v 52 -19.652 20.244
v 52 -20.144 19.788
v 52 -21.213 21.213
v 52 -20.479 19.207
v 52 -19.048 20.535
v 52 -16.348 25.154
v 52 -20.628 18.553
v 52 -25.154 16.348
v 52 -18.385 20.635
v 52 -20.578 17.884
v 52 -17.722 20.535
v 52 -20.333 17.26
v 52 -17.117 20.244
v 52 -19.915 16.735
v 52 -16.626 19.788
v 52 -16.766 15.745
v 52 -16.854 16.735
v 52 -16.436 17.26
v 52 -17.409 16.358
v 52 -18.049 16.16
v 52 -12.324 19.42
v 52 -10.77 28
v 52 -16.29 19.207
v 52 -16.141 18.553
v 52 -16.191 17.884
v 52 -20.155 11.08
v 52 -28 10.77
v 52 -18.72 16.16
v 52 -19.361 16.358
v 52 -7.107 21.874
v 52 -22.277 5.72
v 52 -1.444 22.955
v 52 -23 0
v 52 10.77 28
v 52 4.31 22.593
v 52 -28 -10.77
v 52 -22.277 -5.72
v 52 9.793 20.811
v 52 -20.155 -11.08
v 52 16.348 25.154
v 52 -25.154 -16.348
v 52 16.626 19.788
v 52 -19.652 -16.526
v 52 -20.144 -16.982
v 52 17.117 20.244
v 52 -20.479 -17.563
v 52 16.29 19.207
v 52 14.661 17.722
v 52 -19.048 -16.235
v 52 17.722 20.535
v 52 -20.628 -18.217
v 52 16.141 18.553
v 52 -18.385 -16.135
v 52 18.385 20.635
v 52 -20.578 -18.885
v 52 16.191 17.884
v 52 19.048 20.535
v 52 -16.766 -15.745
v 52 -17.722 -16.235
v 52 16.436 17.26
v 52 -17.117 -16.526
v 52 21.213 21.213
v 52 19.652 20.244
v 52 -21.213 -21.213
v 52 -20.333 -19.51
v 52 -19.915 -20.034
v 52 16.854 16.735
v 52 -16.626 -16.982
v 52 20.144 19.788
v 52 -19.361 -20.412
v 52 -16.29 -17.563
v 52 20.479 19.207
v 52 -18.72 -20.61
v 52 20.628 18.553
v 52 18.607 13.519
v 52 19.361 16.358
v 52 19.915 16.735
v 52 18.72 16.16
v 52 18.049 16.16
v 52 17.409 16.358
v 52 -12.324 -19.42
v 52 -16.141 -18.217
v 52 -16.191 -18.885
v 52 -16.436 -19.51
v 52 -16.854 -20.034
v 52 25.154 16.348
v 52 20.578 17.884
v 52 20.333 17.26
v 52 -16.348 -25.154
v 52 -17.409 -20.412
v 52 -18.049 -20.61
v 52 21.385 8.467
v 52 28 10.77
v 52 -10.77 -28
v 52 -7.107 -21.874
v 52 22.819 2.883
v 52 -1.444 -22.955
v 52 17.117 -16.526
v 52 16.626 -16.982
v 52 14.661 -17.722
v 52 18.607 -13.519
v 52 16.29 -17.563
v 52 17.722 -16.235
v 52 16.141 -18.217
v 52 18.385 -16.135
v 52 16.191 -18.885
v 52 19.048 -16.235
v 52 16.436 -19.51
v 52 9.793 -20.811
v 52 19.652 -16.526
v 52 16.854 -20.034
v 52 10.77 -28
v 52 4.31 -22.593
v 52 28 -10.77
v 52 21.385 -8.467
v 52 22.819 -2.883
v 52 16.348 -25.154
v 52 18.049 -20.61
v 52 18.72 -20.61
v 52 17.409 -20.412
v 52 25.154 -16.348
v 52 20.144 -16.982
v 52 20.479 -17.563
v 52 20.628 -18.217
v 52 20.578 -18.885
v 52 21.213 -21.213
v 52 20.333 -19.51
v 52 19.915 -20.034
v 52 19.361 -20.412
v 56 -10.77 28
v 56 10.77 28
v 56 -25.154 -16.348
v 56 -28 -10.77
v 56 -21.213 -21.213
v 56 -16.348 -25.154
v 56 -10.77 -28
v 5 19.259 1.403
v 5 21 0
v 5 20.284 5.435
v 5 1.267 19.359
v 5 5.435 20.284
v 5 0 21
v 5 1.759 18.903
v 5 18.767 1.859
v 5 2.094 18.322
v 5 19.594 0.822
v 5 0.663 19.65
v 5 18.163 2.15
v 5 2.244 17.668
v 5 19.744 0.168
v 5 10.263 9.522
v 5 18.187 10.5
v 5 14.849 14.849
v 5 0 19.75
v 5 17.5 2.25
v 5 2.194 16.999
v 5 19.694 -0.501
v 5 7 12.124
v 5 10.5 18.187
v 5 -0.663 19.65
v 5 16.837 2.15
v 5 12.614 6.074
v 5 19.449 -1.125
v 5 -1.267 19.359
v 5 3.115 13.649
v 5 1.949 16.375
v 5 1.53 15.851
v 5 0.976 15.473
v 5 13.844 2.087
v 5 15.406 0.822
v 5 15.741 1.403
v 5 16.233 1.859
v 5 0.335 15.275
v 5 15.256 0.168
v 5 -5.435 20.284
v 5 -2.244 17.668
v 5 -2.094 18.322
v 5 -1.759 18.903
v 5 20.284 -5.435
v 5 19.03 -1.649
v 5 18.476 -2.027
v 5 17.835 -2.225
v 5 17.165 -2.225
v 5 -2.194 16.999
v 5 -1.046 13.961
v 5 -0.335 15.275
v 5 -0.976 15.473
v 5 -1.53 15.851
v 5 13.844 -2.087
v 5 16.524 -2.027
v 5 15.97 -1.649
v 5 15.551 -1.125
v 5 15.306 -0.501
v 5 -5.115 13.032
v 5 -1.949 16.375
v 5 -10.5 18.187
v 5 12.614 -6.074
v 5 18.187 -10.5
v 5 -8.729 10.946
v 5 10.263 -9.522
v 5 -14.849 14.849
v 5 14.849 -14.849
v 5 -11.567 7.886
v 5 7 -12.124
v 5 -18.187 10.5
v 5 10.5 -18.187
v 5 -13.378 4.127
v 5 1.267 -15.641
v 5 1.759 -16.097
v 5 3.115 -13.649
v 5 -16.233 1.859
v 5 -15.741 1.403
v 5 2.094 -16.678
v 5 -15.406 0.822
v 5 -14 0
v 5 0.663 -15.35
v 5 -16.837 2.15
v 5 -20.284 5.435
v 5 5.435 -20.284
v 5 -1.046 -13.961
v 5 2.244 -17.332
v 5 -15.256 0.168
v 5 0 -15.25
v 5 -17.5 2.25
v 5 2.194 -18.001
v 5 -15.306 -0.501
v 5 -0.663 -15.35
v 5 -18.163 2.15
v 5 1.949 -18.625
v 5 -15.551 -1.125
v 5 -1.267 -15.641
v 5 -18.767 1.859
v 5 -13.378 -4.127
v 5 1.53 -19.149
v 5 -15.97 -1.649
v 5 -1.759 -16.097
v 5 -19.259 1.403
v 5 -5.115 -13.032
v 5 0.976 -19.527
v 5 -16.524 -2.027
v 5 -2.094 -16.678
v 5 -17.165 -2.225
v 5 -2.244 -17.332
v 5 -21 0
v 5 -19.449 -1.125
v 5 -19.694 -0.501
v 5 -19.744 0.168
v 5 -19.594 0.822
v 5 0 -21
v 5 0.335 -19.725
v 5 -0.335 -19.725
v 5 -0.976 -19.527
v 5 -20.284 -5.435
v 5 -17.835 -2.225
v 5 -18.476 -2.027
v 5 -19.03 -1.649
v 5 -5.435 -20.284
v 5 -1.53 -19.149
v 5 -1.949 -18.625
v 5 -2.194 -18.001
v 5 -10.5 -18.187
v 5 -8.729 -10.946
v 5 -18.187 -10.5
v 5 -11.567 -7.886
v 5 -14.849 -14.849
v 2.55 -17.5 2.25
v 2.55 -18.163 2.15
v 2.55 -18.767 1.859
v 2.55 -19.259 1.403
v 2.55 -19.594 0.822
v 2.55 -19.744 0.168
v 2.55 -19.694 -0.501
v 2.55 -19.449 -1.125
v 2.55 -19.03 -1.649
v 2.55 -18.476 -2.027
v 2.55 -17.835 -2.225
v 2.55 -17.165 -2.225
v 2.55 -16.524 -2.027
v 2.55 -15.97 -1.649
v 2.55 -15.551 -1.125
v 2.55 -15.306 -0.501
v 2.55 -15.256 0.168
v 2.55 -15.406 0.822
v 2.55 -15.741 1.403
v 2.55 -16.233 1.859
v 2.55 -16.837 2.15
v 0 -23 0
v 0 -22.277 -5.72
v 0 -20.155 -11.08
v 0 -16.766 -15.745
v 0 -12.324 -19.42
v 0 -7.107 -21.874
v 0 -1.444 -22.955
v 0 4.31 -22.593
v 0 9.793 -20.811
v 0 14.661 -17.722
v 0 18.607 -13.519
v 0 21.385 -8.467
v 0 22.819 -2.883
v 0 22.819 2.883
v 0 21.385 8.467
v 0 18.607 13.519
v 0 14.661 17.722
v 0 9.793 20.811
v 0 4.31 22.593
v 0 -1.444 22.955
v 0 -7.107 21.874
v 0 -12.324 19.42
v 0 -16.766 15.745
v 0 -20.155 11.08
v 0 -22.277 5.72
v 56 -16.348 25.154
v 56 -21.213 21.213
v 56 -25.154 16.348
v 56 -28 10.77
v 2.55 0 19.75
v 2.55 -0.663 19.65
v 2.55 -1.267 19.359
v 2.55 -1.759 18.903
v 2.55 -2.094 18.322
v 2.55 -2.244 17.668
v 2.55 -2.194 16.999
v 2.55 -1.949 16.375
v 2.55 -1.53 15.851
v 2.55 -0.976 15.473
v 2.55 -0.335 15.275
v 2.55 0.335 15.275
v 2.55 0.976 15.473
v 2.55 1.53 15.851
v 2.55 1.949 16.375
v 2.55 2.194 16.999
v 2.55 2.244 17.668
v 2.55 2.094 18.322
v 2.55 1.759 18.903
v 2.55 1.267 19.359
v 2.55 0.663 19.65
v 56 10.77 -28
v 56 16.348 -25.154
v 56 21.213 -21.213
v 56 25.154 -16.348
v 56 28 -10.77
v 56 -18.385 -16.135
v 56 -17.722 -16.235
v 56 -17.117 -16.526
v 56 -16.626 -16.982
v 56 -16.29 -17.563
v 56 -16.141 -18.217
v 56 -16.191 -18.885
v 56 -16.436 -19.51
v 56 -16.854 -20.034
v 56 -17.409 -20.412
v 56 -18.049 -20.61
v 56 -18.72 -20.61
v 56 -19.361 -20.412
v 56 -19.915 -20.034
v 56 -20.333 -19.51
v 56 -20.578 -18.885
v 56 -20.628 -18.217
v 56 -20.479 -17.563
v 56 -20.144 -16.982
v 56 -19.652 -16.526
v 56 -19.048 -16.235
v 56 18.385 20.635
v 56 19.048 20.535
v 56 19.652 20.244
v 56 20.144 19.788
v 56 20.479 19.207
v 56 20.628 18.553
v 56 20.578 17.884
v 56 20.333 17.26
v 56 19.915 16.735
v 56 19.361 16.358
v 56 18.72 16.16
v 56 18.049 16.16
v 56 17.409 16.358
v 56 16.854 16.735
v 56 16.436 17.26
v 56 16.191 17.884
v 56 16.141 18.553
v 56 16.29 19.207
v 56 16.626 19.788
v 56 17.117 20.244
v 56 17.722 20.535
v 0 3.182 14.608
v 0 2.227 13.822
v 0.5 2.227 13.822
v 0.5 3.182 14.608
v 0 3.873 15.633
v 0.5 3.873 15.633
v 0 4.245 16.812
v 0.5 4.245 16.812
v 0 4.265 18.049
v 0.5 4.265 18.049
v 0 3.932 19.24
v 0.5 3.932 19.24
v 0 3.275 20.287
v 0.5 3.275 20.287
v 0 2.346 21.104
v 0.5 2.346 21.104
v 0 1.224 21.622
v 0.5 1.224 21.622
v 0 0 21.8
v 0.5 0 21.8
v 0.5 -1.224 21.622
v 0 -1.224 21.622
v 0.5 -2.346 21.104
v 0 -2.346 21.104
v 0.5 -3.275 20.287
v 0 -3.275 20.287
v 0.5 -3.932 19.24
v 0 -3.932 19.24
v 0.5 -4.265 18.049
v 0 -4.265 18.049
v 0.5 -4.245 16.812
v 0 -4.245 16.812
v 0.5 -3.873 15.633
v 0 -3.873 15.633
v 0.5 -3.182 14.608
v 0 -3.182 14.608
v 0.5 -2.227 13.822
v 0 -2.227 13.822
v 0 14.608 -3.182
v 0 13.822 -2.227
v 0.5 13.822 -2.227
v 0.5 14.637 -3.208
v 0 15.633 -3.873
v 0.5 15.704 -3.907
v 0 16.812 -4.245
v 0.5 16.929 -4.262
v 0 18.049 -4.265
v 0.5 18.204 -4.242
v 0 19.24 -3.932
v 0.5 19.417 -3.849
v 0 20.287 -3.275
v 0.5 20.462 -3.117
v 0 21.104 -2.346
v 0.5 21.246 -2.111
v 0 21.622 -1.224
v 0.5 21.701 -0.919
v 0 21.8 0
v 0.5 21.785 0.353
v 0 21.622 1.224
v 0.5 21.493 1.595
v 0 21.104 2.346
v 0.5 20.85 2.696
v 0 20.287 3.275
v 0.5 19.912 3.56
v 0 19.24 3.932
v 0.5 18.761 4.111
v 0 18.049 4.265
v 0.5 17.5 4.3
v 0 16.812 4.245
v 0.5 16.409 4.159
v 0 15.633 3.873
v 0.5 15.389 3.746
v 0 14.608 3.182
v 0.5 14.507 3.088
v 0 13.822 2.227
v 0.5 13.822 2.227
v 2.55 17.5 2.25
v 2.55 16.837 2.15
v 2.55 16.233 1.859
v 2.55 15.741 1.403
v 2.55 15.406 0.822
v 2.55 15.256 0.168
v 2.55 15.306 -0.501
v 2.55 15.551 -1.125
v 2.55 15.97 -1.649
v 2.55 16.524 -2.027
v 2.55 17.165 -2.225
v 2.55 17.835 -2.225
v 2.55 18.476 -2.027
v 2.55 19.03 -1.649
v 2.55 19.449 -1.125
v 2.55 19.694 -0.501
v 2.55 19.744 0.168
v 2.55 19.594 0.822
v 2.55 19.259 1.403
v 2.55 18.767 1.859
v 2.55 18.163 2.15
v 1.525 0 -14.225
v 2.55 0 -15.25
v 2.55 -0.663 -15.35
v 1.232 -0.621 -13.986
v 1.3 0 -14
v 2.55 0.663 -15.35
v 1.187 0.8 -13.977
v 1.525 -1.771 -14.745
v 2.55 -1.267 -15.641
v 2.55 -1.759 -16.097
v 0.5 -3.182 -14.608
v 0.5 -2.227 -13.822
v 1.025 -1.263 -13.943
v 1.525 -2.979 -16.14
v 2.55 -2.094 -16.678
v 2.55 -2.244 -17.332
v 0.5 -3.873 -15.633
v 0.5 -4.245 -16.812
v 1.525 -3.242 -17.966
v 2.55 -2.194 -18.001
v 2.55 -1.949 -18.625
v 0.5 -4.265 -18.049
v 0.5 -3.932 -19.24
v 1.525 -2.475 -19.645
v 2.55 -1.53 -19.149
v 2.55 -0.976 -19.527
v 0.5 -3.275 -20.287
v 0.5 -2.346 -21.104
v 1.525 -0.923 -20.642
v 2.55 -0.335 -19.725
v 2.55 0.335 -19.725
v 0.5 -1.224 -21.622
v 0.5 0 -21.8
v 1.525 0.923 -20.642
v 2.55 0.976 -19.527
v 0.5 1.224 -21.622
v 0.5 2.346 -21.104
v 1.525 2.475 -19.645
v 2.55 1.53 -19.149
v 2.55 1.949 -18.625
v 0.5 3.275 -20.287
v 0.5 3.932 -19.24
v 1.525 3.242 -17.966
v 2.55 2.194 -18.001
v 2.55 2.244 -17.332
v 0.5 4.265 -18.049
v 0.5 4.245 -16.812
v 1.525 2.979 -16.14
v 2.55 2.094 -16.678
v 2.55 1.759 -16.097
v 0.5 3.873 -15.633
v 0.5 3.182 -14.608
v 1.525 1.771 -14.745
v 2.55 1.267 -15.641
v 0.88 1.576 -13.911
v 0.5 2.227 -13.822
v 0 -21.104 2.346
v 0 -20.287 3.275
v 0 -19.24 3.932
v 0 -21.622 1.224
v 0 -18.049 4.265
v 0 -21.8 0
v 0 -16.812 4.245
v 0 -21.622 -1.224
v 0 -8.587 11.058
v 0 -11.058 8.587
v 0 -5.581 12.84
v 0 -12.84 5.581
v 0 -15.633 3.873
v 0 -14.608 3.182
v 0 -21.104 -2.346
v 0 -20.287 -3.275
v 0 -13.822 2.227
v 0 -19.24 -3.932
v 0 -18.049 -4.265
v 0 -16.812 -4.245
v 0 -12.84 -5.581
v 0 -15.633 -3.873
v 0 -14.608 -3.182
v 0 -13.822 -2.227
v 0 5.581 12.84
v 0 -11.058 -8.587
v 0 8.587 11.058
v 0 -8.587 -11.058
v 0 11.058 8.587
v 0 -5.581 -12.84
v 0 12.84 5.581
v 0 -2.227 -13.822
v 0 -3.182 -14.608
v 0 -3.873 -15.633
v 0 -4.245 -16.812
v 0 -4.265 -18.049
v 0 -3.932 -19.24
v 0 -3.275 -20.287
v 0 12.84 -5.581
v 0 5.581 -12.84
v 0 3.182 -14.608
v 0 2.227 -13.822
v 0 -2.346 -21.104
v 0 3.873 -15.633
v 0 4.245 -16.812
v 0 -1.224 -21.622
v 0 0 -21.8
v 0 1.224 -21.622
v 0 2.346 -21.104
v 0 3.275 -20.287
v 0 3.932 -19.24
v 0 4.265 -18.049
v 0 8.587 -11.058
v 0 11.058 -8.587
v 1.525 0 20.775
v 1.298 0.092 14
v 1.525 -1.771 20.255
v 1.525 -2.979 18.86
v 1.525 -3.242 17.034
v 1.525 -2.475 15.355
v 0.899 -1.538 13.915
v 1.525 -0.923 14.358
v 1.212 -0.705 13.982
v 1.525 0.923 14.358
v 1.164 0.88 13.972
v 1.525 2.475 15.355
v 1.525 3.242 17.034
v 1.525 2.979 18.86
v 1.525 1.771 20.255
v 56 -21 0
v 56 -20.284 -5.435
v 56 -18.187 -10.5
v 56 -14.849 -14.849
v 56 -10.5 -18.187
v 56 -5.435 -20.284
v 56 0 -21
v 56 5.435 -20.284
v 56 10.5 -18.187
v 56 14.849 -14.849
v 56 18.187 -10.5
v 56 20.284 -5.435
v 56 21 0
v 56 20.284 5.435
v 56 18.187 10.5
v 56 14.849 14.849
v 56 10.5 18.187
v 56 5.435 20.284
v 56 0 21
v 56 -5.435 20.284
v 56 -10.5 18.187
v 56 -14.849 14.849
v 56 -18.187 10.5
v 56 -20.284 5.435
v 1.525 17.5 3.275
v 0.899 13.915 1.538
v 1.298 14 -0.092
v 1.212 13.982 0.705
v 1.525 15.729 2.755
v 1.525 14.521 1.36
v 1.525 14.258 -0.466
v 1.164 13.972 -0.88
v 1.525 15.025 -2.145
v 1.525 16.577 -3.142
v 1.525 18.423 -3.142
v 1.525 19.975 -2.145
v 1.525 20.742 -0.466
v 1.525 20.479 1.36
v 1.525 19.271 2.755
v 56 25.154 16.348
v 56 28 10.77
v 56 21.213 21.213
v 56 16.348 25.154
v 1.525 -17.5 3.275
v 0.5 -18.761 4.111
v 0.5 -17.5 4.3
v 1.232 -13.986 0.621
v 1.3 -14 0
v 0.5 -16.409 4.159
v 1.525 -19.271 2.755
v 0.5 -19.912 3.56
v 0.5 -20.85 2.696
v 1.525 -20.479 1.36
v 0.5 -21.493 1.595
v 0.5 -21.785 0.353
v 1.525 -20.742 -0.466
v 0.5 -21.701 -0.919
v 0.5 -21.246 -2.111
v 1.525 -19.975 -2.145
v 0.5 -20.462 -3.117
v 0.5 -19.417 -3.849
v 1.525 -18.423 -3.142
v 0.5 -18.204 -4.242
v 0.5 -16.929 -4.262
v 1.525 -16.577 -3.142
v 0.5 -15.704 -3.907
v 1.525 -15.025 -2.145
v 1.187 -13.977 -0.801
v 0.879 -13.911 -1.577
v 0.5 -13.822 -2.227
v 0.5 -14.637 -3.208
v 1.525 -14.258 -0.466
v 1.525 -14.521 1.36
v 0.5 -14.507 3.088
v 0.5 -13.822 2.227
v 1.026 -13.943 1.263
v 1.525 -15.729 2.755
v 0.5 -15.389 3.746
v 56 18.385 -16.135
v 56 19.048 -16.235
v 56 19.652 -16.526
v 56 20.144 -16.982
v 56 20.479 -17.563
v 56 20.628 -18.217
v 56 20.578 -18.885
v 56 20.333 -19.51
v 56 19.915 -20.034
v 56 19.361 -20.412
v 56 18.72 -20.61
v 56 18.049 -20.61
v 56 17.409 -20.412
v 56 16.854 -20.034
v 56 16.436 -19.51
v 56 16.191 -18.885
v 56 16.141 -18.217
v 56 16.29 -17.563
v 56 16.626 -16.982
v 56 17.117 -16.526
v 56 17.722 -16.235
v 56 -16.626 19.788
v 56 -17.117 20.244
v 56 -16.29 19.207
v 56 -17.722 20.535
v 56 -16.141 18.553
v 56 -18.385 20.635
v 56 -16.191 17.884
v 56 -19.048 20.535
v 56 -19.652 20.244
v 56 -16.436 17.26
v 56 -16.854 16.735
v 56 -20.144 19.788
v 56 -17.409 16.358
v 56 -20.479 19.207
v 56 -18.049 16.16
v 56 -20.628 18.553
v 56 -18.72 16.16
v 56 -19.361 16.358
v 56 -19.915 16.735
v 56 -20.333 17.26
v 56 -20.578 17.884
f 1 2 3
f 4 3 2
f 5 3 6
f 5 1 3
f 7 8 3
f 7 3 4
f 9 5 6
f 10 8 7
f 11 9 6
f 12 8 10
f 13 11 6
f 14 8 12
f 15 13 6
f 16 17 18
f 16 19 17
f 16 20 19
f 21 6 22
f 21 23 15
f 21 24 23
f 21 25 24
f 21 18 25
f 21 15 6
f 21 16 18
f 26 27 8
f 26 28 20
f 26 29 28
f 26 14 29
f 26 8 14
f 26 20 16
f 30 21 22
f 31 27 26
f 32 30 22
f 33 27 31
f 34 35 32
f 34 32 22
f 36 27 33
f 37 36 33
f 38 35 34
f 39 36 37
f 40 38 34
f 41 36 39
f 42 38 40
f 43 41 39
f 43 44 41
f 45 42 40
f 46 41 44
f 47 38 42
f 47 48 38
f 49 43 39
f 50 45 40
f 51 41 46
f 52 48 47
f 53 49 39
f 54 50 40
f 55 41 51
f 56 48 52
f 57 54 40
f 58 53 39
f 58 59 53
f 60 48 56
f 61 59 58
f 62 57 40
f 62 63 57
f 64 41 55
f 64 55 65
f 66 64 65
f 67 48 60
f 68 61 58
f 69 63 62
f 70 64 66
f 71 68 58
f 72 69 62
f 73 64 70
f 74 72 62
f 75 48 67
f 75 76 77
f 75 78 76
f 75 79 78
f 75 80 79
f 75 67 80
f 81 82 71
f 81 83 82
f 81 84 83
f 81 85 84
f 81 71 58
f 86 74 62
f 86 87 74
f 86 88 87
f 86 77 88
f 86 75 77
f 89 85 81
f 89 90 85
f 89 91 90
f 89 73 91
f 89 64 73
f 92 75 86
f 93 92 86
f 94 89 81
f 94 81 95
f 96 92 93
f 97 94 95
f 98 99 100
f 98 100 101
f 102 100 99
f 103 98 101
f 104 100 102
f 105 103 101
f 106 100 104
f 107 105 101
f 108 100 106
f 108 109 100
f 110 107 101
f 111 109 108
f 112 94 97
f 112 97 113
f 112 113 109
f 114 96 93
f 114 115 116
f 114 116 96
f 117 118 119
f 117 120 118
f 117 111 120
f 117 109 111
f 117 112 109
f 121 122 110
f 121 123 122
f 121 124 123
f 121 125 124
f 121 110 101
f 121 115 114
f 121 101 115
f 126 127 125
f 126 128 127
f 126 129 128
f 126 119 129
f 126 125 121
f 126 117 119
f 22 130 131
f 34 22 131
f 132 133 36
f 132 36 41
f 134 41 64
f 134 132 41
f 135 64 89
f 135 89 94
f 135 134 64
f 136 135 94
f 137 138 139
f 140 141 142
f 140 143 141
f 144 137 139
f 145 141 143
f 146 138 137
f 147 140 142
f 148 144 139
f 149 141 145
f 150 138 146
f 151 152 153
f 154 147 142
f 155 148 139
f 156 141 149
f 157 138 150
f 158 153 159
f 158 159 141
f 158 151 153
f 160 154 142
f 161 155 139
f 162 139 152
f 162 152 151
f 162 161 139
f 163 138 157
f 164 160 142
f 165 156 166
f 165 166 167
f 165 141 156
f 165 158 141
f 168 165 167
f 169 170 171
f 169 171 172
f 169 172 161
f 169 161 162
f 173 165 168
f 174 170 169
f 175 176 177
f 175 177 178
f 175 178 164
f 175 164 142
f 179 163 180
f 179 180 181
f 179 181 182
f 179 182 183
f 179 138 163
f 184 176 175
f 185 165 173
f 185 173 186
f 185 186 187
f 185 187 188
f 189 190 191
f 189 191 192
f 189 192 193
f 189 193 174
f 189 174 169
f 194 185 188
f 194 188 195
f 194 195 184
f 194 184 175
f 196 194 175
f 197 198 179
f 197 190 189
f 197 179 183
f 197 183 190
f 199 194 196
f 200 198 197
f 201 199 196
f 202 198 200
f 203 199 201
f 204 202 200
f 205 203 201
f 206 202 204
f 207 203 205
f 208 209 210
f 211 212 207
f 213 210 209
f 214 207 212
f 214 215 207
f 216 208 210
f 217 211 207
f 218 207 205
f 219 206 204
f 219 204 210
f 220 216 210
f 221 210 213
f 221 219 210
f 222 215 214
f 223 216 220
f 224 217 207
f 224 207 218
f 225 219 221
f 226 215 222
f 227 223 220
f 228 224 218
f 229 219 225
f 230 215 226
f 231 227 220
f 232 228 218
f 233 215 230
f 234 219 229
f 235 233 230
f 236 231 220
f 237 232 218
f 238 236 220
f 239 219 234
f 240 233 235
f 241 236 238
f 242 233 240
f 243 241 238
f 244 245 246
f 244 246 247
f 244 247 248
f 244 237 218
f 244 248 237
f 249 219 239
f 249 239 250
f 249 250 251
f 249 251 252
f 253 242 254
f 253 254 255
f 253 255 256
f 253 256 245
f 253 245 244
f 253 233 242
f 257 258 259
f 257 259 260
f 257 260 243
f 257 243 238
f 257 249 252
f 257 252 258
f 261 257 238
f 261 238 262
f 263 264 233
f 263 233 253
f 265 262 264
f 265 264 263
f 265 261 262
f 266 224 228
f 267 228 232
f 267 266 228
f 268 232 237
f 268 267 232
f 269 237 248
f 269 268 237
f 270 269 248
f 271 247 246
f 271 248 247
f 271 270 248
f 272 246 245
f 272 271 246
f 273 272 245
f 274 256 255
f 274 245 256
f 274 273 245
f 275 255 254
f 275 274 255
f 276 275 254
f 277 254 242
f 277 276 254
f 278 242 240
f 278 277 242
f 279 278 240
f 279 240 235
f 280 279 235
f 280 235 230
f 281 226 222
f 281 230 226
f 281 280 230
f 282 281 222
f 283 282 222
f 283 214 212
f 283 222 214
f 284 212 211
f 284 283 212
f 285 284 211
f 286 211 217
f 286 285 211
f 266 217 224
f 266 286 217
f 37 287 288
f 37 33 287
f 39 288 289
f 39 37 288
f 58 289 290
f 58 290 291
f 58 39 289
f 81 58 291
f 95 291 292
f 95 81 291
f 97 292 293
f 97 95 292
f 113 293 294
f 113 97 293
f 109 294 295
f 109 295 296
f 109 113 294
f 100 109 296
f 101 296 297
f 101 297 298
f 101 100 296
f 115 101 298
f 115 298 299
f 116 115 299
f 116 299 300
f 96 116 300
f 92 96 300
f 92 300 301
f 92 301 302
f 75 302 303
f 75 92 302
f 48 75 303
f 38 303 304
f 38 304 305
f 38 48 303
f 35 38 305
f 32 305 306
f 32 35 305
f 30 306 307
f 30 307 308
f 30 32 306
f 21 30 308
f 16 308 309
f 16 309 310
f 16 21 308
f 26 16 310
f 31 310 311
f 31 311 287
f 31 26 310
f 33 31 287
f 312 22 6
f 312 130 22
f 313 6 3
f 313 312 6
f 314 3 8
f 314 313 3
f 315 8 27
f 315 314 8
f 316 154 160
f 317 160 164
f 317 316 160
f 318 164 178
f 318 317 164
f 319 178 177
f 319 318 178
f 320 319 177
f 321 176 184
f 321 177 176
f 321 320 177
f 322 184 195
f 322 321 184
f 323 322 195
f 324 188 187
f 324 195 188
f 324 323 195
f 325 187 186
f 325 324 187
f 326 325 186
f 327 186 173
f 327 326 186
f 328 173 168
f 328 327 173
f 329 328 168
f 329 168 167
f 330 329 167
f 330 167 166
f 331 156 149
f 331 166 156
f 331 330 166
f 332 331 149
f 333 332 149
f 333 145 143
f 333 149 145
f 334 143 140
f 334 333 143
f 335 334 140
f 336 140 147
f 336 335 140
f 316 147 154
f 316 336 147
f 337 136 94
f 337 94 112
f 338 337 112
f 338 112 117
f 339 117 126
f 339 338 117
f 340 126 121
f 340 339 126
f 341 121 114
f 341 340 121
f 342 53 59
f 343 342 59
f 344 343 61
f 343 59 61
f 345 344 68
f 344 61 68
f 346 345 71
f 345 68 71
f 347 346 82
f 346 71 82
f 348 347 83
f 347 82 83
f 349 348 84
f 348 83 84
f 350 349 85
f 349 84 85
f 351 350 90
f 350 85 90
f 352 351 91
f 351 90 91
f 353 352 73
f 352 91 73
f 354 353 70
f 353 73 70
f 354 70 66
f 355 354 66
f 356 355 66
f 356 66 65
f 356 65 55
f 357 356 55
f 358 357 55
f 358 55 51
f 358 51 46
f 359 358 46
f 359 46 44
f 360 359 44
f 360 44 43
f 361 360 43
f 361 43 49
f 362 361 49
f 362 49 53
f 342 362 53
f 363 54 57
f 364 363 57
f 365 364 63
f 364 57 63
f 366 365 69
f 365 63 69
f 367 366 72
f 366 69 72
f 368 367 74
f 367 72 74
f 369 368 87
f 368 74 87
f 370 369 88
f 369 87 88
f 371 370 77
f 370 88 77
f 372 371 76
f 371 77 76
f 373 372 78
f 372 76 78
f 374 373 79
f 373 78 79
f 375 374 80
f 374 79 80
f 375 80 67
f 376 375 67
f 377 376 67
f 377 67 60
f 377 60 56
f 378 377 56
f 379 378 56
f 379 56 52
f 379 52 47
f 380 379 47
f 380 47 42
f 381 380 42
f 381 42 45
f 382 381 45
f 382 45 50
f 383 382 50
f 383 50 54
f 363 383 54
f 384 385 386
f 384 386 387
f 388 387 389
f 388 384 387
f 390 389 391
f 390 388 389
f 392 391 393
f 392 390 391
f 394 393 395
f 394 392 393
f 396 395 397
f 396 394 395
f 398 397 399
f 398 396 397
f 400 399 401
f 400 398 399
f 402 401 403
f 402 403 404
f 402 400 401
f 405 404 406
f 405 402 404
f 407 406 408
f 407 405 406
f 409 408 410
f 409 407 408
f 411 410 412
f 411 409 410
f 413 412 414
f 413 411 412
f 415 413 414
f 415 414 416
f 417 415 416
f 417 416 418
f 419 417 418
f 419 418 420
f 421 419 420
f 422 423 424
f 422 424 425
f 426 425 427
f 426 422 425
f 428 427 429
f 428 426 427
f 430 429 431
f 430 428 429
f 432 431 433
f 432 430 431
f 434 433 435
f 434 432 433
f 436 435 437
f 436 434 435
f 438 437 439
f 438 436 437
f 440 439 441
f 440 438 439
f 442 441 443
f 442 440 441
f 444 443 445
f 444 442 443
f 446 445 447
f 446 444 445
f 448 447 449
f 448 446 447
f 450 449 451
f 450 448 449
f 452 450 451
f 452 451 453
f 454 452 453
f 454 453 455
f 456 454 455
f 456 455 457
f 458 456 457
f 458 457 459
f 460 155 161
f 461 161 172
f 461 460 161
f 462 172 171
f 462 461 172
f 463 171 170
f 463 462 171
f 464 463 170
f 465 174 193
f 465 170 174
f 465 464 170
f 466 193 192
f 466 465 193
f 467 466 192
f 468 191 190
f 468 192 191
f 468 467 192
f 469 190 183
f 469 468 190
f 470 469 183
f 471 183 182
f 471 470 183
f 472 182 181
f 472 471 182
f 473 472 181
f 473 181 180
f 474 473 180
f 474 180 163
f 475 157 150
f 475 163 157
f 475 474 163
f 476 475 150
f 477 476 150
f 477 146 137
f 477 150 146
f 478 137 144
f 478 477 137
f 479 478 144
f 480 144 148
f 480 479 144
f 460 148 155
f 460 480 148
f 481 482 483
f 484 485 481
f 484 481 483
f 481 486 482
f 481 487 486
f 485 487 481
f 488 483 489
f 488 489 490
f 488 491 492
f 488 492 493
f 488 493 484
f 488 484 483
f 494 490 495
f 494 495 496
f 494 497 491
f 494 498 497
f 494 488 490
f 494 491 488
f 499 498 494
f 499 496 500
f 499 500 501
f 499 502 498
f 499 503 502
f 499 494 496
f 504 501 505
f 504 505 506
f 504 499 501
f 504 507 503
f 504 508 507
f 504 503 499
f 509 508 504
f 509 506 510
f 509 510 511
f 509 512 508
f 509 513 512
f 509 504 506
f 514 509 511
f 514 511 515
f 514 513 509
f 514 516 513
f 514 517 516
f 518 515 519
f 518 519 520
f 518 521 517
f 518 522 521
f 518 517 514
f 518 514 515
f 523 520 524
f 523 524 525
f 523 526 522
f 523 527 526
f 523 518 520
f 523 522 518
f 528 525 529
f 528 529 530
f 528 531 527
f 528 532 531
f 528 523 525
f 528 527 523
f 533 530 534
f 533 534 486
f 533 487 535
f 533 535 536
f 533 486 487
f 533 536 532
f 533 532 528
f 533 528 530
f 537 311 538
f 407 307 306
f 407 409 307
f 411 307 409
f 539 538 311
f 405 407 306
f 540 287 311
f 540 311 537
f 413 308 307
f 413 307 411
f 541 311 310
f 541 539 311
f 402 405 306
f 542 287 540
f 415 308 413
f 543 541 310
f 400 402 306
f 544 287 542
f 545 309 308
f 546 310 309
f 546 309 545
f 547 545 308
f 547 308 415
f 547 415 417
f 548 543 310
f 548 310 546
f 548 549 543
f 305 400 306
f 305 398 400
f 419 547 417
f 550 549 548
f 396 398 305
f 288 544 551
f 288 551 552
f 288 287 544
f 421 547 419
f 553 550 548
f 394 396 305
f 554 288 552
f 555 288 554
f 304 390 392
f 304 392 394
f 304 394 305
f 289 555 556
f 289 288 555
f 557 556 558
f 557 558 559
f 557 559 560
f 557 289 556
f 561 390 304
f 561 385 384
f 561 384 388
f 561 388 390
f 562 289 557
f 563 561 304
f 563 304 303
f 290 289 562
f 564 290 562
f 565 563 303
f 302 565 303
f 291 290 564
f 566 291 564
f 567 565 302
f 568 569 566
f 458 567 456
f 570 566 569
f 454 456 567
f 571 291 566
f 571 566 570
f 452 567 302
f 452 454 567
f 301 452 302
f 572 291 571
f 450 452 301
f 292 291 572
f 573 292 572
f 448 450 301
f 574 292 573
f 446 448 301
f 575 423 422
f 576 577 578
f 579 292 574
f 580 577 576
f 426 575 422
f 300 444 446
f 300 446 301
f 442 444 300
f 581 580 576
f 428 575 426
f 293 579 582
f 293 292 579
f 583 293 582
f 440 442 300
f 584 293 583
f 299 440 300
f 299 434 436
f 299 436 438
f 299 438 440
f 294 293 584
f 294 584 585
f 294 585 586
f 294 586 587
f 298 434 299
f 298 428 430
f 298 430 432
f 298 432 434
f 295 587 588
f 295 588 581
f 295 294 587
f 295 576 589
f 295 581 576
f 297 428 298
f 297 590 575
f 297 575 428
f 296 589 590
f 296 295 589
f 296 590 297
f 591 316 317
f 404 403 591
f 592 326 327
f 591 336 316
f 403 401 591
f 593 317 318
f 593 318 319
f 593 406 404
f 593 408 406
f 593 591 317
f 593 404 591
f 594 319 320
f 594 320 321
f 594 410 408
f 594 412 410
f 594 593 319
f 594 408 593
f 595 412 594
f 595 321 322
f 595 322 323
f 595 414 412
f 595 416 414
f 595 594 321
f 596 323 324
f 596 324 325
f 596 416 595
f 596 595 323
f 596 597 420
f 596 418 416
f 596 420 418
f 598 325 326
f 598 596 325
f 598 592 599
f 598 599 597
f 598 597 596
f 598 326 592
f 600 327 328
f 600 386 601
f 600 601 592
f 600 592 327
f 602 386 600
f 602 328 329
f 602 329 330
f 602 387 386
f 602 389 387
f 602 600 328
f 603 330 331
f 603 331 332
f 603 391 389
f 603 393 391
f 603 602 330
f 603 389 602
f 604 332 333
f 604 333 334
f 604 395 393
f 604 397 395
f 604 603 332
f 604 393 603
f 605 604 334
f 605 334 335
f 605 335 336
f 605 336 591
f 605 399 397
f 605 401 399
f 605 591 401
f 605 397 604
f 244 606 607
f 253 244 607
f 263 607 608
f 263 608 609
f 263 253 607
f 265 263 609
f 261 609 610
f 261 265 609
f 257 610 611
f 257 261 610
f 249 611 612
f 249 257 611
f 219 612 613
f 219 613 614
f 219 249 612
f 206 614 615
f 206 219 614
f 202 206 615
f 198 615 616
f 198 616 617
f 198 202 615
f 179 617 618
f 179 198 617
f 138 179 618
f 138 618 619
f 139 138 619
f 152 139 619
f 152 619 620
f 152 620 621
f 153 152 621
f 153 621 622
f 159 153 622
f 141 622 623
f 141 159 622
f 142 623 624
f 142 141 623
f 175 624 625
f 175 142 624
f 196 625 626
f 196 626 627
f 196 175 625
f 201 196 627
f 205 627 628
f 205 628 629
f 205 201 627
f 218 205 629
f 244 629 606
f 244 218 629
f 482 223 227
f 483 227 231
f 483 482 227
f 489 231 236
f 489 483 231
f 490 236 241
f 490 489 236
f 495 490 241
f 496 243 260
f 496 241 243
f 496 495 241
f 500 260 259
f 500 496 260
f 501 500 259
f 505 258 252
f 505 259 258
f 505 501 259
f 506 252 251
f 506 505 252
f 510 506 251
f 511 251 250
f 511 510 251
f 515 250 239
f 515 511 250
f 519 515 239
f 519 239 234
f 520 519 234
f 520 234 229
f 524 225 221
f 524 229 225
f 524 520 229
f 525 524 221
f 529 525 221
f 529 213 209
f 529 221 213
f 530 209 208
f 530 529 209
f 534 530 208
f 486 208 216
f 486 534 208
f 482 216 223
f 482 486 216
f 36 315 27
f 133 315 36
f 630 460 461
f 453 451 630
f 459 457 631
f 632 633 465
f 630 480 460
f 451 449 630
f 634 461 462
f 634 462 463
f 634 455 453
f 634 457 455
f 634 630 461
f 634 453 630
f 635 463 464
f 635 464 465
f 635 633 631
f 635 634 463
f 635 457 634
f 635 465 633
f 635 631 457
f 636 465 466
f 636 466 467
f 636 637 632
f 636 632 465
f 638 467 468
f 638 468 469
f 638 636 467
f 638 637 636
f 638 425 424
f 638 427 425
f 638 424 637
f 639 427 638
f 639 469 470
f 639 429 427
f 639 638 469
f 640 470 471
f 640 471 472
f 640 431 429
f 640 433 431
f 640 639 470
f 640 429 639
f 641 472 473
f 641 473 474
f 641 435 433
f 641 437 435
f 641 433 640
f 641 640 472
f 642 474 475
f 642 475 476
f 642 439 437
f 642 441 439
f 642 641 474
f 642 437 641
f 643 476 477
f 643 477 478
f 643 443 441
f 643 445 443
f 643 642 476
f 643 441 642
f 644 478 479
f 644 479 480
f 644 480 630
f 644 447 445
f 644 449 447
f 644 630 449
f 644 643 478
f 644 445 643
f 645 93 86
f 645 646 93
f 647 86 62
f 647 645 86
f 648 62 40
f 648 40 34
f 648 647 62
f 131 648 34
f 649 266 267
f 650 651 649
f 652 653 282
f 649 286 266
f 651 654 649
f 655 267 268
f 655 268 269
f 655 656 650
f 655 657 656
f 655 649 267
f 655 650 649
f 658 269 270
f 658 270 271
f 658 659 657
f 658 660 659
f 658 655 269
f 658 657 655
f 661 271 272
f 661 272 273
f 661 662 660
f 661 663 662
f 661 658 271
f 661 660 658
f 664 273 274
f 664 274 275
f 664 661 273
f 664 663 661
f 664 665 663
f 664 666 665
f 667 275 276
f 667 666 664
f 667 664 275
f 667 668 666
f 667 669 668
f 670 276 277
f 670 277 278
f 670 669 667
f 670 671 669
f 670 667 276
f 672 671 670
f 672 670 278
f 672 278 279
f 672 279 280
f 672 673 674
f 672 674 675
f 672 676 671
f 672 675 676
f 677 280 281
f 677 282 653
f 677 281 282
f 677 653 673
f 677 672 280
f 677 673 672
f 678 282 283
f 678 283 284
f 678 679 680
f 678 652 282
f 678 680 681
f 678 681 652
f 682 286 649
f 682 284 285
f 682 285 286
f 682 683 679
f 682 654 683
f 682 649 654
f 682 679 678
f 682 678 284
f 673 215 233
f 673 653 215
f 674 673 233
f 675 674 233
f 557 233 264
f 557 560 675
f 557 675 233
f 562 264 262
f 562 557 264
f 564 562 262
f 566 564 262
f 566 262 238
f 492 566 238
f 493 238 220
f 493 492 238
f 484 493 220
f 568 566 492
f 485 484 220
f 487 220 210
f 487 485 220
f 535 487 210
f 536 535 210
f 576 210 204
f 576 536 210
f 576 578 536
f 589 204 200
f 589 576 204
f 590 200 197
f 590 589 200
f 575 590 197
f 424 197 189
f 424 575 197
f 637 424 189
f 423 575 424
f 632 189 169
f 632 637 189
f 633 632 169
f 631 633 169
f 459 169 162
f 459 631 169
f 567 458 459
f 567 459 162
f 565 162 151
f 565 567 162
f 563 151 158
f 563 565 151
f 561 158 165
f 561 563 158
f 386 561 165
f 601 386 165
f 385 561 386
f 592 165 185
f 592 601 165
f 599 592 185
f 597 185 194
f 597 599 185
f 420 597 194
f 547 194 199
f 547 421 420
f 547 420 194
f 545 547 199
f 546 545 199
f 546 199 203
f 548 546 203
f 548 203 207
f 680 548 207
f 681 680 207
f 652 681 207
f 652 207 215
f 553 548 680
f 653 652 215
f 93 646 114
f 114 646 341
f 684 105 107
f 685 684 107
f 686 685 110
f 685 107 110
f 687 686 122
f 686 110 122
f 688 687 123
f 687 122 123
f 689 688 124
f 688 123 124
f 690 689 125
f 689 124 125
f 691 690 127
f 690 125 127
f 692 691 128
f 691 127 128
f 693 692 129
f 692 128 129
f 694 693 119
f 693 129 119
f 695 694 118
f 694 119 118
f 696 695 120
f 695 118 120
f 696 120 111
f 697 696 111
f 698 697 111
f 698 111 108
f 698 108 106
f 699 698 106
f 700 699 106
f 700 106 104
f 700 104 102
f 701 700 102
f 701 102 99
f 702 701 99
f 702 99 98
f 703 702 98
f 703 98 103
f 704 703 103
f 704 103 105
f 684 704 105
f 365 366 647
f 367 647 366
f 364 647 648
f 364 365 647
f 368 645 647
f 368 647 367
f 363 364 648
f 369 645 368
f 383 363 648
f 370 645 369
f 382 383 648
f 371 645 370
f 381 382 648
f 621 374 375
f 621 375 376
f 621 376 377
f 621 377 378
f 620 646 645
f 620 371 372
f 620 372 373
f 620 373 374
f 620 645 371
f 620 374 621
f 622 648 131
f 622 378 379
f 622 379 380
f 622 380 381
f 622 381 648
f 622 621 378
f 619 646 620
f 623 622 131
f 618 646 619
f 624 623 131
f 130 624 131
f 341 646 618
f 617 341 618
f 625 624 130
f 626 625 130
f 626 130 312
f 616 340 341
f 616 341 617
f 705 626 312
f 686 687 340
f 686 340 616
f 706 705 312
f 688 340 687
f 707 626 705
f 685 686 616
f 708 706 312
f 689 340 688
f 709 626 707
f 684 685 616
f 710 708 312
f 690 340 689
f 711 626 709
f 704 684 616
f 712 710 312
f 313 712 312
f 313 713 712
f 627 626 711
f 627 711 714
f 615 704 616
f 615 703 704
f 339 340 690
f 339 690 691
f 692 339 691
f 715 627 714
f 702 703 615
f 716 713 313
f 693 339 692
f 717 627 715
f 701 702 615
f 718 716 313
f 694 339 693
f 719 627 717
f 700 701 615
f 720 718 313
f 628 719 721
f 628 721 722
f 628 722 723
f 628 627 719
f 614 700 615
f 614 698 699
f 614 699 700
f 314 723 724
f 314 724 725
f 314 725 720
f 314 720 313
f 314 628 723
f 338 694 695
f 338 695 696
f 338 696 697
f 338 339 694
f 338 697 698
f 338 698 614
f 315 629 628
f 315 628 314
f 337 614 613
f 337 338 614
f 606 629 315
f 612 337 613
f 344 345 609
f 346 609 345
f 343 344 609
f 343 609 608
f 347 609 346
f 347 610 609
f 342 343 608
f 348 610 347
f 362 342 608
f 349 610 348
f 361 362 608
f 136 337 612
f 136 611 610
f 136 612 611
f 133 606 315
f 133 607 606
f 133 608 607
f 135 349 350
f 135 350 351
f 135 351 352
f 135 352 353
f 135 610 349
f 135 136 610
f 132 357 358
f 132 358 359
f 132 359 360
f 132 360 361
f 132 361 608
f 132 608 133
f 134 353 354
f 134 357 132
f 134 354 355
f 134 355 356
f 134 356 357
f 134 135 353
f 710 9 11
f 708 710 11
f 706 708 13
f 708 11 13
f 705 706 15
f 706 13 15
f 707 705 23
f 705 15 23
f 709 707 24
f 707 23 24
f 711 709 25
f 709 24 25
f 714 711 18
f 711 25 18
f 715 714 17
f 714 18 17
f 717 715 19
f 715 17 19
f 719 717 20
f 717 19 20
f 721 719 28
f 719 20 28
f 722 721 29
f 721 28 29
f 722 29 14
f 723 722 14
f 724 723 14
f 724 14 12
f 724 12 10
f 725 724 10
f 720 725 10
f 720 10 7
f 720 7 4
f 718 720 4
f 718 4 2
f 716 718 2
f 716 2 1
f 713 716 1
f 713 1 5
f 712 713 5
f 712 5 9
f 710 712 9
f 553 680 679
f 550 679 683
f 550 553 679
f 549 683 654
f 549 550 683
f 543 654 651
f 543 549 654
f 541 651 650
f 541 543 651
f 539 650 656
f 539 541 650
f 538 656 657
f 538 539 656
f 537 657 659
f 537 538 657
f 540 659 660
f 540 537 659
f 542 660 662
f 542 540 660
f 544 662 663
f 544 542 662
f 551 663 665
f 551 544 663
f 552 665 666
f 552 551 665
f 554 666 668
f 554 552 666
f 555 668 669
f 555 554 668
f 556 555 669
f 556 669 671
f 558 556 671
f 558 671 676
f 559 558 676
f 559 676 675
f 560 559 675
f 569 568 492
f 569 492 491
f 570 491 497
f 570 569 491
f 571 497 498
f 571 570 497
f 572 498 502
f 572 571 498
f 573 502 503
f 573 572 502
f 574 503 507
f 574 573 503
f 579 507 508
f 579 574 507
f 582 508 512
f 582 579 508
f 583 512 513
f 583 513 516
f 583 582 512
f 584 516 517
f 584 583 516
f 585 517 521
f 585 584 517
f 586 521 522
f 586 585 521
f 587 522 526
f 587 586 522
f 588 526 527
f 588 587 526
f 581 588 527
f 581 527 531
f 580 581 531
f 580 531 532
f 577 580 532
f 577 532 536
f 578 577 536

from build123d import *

# Parameters (mm, degrees)
HOLE_WIZARD_2_AT_2_COUNT = 2
HOLE_WIZARD_2_AT_2_PITCH = 24.748737342
HOLE_WIZARD_2_AT_3_COUNT = 2
HOLE_WIZARD_2_AT_3_PITCH = 35
HOLE_WIZARD_2_AT_4_COUNT = 2
HOLE_WIZARD_2_AT_4_PITCH = 24.748737342
SKETCH_18_OUTSIDE_W      = 82.334
SKETCH_18_OUTSIDE_H      = 82.334
SKETCH_18_OUTSIDE_W_2    = 56
SKETCH_18_OUTSIDE_H_2    = 56
CUT_EXTRUDE_3_DEPTH      = 4
HOLE_WIZARD_M4_1_D       = 4.5


with BuildPart() as part:
    # 草图1 → 旋转2 (revolve)
    with BuildSketch(Plane.XY, mode=Mode.PRIVATE) as revolve_2_sk:
        Polygon((52, 23), (52, 30), (56, 30), (56, 21), (5, 21), (5, 14), (0, 14), (0, 23), align=None)
    revolve(revolve_2_sk.sketch.rotate(Axis((0, 0, 0), (1, 0, 0)), 180), axis=Axis((0, 0, 0), (1, 0, 0)))

    # 草图10 → 打孔尺寸根据十字槽沉头木螺钉的类型2 (revolve, cut)
    with BuildSketch(Plane(origin=(0, 0, 17.5), x_dir=(0, 0, 1), z_dir=(0, 1, 0))):
        Polygon((0, 0), (0, 56), (2.25, 56), (2.25, 2.55), (4.3, 0.5), (4.3, 0), align=None)
    hole_wizard_2 = revolve(axis=Axis((-6.35, 0, 17.5), (1, 0, 0)), mode=Mode.SUBTRACT)

    # 打孔尺寸根据十字槽沉头木螺钉的类型2 at 2: 打孔尺寸根据十字槽沉头木螺钉的类型2 ×2
    with Locations(*[Vector(0, -0.7071067811865575, -0.7071067811865376) * (i * HOLE_WIZARD_2_AT_2_PITCH) for i in range(1, HOLE_WIZARD_2_AT_2_COUNT)]):
        add(hole_wizard_2, mode=Mode.SUBTRACT)

    # 打孔尺寸根据十字槽沉头木螺钉的类型2 at 3: 打孔尺寸根据十字槽沉头木螺钉的类型2 ×2
    with Locations(*[(0, 0, -i * HOLE_WIZARD_2_AT_3_PITCH) for i in range(1, HOLE_WIZARD_2_AT_3_COUNT)]):
        add(hole_wizard_2, mode=Mode.SUBTRACT)

    # 打孔尺寸根据十字槽沉头木螺钉的类型2 at 4: 打孔尺寸根据十字槽沉头木螺钉的类型2 ×2
    with Locations(*[Vector(0, 0.7071067811865376, -0.7071067811865575) * (i * HOLE_WIZARD_2_AT_4_PITCH) for i in range(1, HOLE_WIZARD_2_AT_4_COUNT)]):
        add(hole_wizard_2, mode=Mode.SUBTRACT)

    # 草图18 outside → 切除-拉伸3 (cut)
    with BuildSketch(Plane(origin=(56, 0, 0), x_dir=(0, 0, -1), z_dir=(1, 0, 0))):
        Rectangle(SKETCH_18_OUTSIDE_W, SKETCH_18_OUTSIDE_H)
        Rectangle(SKETCH_18_OUTSIDE_W_2, SKETCH_18_OUTSIDE_H_2, mode=Mode.SUBTRACT)
    extrude(amount=-CUT_EXTRUDE_3_DEPTH, mode=Mode.SUBTRACT)

    # M4 间隙孔1 (through all)
    with Locations(Plane(origin=(56, 0, 0), x_dir=(0, 0, -1), z_dir=(1, 0, 0))):
        with Locations((18.384776311, 18.384776311), (18.384776311, -18.384776311), (-18.384776311, -18.384776311), (-18.384776311, 18.384776311)):
            Hole(HOLE_WIZARD_M4_1_D / 2)


solid = part.part
